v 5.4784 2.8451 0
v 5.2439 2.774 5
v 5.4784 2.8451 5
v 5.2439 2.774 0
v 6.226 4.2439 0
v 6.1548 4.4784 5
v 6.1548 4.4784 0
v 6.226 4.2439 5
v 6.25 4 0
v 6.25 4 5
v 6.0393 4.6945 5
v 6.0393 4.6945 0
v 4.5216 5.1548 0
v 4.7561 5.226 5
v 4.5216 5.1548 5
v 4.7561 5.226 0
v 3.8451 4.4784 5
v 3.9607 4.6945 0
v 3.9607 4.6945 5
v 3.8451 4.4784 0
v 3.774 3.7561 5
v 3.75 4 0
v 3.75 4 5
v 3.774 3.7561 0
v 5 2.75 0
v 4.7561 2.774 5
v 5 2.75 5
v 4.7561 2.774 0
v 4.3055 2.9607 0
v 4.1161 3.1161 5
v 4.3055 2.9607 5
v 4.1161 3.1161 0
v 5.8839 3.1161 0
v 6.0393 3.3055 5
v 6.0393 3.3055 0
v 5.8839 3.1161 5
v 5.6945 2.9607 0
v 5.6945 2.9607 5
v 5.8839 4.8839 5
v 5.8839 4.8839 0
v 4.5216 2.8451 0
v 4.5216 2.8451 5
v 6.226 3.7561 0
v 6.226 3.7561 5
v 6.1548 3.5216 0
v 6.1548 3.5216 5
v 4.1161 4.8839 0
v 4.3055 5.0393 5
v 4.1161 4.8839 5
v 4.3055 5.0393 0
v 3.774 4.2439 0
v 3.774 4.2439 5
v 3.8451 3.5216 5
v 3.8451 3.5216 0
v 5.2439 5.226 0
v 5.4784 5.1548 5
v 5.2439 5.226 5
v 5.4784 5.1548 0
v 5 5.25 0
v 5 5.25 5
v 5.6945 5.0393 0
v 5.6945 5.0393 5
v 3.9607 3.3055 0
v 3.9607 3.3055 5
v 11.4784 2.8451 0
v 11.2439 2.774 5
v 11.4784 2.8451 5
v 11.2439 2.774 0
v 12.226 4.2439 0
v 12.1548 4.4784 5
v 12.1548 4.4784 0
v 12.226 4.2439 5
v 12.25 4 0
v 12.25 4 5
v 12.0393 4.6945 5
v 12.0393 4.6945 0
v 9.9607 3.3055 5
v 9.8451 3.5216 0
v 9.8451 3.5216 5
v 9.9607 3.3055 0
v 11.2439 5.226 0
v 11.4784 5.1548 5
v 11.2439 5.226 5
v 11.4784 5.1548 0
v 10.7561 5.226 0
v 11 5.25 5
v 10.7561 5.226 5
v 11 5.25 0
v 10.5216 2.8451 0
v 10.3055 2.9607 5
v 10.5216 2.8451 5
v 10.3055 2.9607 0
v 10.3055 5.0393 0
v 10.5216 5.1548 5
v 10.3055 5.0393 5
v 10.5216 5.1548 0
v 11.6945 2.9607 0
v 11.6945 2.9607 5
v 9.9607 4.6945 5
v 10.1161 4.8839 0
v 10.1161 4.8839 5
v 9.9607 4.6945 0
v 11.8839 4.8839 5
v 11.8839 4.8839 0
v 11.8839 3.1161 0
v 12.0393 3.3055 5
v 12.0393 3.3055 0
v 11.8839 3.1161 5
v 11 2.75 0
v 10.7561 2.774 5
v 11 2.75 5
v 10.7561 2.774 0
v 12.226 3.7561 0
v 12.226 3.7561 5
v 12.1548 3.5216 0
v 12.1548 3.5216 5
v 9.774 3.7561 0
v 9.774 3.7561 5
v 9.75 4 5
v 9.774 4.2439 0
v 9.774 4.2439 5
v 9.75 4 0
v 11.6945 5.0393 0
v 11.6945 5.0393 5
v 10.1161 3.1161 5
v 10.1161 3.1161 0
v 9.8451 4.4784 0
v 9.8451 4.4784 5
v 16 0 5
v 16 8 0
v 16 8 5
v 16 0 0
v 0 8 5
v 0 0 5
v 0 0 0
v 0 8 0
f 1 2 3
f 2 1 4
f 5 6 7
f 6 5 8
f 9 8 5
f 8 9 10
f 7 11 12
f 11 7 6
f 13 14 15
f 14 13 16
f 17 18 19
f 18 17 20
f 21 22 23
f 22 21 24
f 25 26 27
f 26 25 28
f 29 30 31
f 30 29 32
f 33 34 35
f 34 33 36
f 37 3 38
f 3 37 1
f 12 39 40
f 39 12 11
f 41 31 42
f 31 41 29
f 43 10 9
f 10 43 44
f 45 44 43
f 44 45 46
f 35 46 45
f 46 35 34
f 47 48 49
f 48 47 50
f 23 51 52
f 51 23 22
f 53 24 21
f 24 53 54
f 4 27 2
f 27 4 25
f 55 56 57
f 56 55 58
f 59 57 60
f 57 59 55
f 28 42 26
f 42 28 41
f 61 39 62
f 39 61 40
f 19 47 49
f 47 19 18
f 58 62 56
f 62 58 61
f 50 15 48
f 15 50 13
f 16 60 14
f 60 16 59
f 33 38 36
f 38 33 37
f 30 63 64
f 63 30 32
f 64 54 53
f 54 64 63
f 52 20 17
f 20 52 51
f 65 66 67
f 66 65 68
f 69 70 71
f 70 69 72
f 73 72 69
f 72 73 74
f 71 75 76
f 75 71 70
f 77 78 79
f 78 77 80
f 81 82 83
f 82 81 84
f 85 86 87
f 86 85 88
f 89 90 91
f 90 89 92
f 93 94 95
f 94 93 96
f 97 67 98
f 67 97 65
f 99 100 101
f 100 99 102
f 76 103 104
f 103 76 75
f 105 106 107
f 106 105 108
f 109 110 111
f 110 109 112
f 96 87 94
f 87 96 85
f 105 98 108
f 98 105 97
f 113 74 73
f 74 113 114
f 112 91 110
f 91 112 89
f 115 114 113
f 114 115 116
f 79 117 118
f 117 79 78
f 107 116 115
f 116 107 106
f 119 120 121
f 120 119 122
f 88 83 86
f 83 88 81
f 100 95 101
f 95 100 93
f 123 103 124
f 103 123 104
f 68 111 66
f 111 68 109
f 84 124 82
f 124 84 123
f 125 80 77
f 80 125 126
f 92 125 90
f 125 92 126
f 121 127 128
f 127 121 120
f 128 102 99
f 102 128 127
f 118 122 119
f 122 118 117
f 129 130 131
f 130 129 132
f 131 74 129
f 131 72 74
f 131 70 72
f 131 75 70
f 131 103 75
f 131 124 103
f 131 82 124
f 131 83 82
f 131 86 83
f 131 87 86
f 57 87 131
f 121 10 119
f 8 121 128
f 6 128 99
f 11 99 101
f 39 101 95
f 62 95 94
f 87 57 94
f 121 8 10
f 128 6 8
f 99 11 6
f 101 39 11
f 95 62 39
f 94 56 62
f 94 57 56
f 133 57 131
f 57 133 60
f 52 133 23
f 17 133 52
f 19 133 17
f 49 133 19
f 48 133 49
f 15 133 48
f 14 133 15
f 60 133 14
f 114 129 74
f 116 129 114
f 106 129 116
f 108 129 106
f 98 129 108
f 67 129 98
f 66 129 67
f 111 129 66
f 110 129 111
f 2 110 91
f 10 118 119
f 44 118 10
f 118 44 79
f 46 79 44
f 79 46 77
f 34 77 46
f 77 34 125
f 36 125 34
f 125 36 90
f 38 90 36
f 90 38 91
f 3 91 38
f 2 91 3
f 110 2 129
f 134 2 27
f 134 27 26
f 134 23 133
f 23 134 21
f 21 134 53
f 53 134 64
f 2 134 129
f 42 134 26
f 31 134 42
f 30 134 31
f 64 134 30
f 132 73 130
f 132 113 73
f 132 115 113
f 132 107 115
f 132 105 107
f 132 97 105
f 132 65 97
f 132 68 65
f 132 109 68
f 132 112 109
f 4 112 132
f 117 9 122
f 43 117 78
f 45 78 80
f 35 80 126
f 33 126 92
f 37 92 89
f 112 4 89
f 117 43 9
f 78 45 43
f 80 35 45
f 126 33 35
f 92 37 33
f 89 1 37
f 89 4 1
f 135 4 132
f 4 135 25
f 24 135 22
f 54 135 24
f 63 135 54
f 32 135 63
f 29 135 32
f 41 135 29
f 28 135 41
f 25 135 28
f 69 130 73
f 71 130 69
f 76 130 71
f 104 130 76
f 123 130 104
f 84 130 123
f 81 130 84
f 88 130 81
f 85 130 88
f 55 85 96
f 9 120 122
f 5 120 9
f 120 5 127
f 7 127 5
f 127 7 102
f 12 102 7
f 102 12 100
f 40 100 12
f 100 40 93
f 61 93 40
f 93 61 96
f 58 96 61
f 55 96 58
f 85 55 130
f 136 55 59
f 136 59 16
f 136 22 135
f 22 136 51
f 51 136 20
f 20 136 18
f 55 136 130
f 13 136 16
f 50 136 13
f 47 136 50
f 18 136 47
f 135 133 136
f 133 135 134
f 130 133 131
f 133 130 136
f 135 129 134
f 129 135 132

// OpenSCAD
$fn = 32;

// ----------------------------------------------------------------------
// Micro pad: two-hole pad, 5-20 mm class
// ----------------------------------------------------------------------

// --- parameters (mm) ---
pad_l = 16;               // pad length, X
pad_w = 8;                // pad width, Y
pad_t = 5;                // pad thickness, Z
hole_d = 2.5;             // hole diameter
hole_x = 5;               // X of the first hole centre
fit_tol = 0.05;           // tolerance for press fits, mm
free_tol = 0.2;           // tolerance for clearance fits, mm

difference() {
  cube([pad_l, pad_w, pad_t]);
  for (x = [hole_x, pad_l - hole_x])
    translate([x, pad_w / 2, -1])
      cylinder(h = pad_t + 2, d = hole_d);
}
